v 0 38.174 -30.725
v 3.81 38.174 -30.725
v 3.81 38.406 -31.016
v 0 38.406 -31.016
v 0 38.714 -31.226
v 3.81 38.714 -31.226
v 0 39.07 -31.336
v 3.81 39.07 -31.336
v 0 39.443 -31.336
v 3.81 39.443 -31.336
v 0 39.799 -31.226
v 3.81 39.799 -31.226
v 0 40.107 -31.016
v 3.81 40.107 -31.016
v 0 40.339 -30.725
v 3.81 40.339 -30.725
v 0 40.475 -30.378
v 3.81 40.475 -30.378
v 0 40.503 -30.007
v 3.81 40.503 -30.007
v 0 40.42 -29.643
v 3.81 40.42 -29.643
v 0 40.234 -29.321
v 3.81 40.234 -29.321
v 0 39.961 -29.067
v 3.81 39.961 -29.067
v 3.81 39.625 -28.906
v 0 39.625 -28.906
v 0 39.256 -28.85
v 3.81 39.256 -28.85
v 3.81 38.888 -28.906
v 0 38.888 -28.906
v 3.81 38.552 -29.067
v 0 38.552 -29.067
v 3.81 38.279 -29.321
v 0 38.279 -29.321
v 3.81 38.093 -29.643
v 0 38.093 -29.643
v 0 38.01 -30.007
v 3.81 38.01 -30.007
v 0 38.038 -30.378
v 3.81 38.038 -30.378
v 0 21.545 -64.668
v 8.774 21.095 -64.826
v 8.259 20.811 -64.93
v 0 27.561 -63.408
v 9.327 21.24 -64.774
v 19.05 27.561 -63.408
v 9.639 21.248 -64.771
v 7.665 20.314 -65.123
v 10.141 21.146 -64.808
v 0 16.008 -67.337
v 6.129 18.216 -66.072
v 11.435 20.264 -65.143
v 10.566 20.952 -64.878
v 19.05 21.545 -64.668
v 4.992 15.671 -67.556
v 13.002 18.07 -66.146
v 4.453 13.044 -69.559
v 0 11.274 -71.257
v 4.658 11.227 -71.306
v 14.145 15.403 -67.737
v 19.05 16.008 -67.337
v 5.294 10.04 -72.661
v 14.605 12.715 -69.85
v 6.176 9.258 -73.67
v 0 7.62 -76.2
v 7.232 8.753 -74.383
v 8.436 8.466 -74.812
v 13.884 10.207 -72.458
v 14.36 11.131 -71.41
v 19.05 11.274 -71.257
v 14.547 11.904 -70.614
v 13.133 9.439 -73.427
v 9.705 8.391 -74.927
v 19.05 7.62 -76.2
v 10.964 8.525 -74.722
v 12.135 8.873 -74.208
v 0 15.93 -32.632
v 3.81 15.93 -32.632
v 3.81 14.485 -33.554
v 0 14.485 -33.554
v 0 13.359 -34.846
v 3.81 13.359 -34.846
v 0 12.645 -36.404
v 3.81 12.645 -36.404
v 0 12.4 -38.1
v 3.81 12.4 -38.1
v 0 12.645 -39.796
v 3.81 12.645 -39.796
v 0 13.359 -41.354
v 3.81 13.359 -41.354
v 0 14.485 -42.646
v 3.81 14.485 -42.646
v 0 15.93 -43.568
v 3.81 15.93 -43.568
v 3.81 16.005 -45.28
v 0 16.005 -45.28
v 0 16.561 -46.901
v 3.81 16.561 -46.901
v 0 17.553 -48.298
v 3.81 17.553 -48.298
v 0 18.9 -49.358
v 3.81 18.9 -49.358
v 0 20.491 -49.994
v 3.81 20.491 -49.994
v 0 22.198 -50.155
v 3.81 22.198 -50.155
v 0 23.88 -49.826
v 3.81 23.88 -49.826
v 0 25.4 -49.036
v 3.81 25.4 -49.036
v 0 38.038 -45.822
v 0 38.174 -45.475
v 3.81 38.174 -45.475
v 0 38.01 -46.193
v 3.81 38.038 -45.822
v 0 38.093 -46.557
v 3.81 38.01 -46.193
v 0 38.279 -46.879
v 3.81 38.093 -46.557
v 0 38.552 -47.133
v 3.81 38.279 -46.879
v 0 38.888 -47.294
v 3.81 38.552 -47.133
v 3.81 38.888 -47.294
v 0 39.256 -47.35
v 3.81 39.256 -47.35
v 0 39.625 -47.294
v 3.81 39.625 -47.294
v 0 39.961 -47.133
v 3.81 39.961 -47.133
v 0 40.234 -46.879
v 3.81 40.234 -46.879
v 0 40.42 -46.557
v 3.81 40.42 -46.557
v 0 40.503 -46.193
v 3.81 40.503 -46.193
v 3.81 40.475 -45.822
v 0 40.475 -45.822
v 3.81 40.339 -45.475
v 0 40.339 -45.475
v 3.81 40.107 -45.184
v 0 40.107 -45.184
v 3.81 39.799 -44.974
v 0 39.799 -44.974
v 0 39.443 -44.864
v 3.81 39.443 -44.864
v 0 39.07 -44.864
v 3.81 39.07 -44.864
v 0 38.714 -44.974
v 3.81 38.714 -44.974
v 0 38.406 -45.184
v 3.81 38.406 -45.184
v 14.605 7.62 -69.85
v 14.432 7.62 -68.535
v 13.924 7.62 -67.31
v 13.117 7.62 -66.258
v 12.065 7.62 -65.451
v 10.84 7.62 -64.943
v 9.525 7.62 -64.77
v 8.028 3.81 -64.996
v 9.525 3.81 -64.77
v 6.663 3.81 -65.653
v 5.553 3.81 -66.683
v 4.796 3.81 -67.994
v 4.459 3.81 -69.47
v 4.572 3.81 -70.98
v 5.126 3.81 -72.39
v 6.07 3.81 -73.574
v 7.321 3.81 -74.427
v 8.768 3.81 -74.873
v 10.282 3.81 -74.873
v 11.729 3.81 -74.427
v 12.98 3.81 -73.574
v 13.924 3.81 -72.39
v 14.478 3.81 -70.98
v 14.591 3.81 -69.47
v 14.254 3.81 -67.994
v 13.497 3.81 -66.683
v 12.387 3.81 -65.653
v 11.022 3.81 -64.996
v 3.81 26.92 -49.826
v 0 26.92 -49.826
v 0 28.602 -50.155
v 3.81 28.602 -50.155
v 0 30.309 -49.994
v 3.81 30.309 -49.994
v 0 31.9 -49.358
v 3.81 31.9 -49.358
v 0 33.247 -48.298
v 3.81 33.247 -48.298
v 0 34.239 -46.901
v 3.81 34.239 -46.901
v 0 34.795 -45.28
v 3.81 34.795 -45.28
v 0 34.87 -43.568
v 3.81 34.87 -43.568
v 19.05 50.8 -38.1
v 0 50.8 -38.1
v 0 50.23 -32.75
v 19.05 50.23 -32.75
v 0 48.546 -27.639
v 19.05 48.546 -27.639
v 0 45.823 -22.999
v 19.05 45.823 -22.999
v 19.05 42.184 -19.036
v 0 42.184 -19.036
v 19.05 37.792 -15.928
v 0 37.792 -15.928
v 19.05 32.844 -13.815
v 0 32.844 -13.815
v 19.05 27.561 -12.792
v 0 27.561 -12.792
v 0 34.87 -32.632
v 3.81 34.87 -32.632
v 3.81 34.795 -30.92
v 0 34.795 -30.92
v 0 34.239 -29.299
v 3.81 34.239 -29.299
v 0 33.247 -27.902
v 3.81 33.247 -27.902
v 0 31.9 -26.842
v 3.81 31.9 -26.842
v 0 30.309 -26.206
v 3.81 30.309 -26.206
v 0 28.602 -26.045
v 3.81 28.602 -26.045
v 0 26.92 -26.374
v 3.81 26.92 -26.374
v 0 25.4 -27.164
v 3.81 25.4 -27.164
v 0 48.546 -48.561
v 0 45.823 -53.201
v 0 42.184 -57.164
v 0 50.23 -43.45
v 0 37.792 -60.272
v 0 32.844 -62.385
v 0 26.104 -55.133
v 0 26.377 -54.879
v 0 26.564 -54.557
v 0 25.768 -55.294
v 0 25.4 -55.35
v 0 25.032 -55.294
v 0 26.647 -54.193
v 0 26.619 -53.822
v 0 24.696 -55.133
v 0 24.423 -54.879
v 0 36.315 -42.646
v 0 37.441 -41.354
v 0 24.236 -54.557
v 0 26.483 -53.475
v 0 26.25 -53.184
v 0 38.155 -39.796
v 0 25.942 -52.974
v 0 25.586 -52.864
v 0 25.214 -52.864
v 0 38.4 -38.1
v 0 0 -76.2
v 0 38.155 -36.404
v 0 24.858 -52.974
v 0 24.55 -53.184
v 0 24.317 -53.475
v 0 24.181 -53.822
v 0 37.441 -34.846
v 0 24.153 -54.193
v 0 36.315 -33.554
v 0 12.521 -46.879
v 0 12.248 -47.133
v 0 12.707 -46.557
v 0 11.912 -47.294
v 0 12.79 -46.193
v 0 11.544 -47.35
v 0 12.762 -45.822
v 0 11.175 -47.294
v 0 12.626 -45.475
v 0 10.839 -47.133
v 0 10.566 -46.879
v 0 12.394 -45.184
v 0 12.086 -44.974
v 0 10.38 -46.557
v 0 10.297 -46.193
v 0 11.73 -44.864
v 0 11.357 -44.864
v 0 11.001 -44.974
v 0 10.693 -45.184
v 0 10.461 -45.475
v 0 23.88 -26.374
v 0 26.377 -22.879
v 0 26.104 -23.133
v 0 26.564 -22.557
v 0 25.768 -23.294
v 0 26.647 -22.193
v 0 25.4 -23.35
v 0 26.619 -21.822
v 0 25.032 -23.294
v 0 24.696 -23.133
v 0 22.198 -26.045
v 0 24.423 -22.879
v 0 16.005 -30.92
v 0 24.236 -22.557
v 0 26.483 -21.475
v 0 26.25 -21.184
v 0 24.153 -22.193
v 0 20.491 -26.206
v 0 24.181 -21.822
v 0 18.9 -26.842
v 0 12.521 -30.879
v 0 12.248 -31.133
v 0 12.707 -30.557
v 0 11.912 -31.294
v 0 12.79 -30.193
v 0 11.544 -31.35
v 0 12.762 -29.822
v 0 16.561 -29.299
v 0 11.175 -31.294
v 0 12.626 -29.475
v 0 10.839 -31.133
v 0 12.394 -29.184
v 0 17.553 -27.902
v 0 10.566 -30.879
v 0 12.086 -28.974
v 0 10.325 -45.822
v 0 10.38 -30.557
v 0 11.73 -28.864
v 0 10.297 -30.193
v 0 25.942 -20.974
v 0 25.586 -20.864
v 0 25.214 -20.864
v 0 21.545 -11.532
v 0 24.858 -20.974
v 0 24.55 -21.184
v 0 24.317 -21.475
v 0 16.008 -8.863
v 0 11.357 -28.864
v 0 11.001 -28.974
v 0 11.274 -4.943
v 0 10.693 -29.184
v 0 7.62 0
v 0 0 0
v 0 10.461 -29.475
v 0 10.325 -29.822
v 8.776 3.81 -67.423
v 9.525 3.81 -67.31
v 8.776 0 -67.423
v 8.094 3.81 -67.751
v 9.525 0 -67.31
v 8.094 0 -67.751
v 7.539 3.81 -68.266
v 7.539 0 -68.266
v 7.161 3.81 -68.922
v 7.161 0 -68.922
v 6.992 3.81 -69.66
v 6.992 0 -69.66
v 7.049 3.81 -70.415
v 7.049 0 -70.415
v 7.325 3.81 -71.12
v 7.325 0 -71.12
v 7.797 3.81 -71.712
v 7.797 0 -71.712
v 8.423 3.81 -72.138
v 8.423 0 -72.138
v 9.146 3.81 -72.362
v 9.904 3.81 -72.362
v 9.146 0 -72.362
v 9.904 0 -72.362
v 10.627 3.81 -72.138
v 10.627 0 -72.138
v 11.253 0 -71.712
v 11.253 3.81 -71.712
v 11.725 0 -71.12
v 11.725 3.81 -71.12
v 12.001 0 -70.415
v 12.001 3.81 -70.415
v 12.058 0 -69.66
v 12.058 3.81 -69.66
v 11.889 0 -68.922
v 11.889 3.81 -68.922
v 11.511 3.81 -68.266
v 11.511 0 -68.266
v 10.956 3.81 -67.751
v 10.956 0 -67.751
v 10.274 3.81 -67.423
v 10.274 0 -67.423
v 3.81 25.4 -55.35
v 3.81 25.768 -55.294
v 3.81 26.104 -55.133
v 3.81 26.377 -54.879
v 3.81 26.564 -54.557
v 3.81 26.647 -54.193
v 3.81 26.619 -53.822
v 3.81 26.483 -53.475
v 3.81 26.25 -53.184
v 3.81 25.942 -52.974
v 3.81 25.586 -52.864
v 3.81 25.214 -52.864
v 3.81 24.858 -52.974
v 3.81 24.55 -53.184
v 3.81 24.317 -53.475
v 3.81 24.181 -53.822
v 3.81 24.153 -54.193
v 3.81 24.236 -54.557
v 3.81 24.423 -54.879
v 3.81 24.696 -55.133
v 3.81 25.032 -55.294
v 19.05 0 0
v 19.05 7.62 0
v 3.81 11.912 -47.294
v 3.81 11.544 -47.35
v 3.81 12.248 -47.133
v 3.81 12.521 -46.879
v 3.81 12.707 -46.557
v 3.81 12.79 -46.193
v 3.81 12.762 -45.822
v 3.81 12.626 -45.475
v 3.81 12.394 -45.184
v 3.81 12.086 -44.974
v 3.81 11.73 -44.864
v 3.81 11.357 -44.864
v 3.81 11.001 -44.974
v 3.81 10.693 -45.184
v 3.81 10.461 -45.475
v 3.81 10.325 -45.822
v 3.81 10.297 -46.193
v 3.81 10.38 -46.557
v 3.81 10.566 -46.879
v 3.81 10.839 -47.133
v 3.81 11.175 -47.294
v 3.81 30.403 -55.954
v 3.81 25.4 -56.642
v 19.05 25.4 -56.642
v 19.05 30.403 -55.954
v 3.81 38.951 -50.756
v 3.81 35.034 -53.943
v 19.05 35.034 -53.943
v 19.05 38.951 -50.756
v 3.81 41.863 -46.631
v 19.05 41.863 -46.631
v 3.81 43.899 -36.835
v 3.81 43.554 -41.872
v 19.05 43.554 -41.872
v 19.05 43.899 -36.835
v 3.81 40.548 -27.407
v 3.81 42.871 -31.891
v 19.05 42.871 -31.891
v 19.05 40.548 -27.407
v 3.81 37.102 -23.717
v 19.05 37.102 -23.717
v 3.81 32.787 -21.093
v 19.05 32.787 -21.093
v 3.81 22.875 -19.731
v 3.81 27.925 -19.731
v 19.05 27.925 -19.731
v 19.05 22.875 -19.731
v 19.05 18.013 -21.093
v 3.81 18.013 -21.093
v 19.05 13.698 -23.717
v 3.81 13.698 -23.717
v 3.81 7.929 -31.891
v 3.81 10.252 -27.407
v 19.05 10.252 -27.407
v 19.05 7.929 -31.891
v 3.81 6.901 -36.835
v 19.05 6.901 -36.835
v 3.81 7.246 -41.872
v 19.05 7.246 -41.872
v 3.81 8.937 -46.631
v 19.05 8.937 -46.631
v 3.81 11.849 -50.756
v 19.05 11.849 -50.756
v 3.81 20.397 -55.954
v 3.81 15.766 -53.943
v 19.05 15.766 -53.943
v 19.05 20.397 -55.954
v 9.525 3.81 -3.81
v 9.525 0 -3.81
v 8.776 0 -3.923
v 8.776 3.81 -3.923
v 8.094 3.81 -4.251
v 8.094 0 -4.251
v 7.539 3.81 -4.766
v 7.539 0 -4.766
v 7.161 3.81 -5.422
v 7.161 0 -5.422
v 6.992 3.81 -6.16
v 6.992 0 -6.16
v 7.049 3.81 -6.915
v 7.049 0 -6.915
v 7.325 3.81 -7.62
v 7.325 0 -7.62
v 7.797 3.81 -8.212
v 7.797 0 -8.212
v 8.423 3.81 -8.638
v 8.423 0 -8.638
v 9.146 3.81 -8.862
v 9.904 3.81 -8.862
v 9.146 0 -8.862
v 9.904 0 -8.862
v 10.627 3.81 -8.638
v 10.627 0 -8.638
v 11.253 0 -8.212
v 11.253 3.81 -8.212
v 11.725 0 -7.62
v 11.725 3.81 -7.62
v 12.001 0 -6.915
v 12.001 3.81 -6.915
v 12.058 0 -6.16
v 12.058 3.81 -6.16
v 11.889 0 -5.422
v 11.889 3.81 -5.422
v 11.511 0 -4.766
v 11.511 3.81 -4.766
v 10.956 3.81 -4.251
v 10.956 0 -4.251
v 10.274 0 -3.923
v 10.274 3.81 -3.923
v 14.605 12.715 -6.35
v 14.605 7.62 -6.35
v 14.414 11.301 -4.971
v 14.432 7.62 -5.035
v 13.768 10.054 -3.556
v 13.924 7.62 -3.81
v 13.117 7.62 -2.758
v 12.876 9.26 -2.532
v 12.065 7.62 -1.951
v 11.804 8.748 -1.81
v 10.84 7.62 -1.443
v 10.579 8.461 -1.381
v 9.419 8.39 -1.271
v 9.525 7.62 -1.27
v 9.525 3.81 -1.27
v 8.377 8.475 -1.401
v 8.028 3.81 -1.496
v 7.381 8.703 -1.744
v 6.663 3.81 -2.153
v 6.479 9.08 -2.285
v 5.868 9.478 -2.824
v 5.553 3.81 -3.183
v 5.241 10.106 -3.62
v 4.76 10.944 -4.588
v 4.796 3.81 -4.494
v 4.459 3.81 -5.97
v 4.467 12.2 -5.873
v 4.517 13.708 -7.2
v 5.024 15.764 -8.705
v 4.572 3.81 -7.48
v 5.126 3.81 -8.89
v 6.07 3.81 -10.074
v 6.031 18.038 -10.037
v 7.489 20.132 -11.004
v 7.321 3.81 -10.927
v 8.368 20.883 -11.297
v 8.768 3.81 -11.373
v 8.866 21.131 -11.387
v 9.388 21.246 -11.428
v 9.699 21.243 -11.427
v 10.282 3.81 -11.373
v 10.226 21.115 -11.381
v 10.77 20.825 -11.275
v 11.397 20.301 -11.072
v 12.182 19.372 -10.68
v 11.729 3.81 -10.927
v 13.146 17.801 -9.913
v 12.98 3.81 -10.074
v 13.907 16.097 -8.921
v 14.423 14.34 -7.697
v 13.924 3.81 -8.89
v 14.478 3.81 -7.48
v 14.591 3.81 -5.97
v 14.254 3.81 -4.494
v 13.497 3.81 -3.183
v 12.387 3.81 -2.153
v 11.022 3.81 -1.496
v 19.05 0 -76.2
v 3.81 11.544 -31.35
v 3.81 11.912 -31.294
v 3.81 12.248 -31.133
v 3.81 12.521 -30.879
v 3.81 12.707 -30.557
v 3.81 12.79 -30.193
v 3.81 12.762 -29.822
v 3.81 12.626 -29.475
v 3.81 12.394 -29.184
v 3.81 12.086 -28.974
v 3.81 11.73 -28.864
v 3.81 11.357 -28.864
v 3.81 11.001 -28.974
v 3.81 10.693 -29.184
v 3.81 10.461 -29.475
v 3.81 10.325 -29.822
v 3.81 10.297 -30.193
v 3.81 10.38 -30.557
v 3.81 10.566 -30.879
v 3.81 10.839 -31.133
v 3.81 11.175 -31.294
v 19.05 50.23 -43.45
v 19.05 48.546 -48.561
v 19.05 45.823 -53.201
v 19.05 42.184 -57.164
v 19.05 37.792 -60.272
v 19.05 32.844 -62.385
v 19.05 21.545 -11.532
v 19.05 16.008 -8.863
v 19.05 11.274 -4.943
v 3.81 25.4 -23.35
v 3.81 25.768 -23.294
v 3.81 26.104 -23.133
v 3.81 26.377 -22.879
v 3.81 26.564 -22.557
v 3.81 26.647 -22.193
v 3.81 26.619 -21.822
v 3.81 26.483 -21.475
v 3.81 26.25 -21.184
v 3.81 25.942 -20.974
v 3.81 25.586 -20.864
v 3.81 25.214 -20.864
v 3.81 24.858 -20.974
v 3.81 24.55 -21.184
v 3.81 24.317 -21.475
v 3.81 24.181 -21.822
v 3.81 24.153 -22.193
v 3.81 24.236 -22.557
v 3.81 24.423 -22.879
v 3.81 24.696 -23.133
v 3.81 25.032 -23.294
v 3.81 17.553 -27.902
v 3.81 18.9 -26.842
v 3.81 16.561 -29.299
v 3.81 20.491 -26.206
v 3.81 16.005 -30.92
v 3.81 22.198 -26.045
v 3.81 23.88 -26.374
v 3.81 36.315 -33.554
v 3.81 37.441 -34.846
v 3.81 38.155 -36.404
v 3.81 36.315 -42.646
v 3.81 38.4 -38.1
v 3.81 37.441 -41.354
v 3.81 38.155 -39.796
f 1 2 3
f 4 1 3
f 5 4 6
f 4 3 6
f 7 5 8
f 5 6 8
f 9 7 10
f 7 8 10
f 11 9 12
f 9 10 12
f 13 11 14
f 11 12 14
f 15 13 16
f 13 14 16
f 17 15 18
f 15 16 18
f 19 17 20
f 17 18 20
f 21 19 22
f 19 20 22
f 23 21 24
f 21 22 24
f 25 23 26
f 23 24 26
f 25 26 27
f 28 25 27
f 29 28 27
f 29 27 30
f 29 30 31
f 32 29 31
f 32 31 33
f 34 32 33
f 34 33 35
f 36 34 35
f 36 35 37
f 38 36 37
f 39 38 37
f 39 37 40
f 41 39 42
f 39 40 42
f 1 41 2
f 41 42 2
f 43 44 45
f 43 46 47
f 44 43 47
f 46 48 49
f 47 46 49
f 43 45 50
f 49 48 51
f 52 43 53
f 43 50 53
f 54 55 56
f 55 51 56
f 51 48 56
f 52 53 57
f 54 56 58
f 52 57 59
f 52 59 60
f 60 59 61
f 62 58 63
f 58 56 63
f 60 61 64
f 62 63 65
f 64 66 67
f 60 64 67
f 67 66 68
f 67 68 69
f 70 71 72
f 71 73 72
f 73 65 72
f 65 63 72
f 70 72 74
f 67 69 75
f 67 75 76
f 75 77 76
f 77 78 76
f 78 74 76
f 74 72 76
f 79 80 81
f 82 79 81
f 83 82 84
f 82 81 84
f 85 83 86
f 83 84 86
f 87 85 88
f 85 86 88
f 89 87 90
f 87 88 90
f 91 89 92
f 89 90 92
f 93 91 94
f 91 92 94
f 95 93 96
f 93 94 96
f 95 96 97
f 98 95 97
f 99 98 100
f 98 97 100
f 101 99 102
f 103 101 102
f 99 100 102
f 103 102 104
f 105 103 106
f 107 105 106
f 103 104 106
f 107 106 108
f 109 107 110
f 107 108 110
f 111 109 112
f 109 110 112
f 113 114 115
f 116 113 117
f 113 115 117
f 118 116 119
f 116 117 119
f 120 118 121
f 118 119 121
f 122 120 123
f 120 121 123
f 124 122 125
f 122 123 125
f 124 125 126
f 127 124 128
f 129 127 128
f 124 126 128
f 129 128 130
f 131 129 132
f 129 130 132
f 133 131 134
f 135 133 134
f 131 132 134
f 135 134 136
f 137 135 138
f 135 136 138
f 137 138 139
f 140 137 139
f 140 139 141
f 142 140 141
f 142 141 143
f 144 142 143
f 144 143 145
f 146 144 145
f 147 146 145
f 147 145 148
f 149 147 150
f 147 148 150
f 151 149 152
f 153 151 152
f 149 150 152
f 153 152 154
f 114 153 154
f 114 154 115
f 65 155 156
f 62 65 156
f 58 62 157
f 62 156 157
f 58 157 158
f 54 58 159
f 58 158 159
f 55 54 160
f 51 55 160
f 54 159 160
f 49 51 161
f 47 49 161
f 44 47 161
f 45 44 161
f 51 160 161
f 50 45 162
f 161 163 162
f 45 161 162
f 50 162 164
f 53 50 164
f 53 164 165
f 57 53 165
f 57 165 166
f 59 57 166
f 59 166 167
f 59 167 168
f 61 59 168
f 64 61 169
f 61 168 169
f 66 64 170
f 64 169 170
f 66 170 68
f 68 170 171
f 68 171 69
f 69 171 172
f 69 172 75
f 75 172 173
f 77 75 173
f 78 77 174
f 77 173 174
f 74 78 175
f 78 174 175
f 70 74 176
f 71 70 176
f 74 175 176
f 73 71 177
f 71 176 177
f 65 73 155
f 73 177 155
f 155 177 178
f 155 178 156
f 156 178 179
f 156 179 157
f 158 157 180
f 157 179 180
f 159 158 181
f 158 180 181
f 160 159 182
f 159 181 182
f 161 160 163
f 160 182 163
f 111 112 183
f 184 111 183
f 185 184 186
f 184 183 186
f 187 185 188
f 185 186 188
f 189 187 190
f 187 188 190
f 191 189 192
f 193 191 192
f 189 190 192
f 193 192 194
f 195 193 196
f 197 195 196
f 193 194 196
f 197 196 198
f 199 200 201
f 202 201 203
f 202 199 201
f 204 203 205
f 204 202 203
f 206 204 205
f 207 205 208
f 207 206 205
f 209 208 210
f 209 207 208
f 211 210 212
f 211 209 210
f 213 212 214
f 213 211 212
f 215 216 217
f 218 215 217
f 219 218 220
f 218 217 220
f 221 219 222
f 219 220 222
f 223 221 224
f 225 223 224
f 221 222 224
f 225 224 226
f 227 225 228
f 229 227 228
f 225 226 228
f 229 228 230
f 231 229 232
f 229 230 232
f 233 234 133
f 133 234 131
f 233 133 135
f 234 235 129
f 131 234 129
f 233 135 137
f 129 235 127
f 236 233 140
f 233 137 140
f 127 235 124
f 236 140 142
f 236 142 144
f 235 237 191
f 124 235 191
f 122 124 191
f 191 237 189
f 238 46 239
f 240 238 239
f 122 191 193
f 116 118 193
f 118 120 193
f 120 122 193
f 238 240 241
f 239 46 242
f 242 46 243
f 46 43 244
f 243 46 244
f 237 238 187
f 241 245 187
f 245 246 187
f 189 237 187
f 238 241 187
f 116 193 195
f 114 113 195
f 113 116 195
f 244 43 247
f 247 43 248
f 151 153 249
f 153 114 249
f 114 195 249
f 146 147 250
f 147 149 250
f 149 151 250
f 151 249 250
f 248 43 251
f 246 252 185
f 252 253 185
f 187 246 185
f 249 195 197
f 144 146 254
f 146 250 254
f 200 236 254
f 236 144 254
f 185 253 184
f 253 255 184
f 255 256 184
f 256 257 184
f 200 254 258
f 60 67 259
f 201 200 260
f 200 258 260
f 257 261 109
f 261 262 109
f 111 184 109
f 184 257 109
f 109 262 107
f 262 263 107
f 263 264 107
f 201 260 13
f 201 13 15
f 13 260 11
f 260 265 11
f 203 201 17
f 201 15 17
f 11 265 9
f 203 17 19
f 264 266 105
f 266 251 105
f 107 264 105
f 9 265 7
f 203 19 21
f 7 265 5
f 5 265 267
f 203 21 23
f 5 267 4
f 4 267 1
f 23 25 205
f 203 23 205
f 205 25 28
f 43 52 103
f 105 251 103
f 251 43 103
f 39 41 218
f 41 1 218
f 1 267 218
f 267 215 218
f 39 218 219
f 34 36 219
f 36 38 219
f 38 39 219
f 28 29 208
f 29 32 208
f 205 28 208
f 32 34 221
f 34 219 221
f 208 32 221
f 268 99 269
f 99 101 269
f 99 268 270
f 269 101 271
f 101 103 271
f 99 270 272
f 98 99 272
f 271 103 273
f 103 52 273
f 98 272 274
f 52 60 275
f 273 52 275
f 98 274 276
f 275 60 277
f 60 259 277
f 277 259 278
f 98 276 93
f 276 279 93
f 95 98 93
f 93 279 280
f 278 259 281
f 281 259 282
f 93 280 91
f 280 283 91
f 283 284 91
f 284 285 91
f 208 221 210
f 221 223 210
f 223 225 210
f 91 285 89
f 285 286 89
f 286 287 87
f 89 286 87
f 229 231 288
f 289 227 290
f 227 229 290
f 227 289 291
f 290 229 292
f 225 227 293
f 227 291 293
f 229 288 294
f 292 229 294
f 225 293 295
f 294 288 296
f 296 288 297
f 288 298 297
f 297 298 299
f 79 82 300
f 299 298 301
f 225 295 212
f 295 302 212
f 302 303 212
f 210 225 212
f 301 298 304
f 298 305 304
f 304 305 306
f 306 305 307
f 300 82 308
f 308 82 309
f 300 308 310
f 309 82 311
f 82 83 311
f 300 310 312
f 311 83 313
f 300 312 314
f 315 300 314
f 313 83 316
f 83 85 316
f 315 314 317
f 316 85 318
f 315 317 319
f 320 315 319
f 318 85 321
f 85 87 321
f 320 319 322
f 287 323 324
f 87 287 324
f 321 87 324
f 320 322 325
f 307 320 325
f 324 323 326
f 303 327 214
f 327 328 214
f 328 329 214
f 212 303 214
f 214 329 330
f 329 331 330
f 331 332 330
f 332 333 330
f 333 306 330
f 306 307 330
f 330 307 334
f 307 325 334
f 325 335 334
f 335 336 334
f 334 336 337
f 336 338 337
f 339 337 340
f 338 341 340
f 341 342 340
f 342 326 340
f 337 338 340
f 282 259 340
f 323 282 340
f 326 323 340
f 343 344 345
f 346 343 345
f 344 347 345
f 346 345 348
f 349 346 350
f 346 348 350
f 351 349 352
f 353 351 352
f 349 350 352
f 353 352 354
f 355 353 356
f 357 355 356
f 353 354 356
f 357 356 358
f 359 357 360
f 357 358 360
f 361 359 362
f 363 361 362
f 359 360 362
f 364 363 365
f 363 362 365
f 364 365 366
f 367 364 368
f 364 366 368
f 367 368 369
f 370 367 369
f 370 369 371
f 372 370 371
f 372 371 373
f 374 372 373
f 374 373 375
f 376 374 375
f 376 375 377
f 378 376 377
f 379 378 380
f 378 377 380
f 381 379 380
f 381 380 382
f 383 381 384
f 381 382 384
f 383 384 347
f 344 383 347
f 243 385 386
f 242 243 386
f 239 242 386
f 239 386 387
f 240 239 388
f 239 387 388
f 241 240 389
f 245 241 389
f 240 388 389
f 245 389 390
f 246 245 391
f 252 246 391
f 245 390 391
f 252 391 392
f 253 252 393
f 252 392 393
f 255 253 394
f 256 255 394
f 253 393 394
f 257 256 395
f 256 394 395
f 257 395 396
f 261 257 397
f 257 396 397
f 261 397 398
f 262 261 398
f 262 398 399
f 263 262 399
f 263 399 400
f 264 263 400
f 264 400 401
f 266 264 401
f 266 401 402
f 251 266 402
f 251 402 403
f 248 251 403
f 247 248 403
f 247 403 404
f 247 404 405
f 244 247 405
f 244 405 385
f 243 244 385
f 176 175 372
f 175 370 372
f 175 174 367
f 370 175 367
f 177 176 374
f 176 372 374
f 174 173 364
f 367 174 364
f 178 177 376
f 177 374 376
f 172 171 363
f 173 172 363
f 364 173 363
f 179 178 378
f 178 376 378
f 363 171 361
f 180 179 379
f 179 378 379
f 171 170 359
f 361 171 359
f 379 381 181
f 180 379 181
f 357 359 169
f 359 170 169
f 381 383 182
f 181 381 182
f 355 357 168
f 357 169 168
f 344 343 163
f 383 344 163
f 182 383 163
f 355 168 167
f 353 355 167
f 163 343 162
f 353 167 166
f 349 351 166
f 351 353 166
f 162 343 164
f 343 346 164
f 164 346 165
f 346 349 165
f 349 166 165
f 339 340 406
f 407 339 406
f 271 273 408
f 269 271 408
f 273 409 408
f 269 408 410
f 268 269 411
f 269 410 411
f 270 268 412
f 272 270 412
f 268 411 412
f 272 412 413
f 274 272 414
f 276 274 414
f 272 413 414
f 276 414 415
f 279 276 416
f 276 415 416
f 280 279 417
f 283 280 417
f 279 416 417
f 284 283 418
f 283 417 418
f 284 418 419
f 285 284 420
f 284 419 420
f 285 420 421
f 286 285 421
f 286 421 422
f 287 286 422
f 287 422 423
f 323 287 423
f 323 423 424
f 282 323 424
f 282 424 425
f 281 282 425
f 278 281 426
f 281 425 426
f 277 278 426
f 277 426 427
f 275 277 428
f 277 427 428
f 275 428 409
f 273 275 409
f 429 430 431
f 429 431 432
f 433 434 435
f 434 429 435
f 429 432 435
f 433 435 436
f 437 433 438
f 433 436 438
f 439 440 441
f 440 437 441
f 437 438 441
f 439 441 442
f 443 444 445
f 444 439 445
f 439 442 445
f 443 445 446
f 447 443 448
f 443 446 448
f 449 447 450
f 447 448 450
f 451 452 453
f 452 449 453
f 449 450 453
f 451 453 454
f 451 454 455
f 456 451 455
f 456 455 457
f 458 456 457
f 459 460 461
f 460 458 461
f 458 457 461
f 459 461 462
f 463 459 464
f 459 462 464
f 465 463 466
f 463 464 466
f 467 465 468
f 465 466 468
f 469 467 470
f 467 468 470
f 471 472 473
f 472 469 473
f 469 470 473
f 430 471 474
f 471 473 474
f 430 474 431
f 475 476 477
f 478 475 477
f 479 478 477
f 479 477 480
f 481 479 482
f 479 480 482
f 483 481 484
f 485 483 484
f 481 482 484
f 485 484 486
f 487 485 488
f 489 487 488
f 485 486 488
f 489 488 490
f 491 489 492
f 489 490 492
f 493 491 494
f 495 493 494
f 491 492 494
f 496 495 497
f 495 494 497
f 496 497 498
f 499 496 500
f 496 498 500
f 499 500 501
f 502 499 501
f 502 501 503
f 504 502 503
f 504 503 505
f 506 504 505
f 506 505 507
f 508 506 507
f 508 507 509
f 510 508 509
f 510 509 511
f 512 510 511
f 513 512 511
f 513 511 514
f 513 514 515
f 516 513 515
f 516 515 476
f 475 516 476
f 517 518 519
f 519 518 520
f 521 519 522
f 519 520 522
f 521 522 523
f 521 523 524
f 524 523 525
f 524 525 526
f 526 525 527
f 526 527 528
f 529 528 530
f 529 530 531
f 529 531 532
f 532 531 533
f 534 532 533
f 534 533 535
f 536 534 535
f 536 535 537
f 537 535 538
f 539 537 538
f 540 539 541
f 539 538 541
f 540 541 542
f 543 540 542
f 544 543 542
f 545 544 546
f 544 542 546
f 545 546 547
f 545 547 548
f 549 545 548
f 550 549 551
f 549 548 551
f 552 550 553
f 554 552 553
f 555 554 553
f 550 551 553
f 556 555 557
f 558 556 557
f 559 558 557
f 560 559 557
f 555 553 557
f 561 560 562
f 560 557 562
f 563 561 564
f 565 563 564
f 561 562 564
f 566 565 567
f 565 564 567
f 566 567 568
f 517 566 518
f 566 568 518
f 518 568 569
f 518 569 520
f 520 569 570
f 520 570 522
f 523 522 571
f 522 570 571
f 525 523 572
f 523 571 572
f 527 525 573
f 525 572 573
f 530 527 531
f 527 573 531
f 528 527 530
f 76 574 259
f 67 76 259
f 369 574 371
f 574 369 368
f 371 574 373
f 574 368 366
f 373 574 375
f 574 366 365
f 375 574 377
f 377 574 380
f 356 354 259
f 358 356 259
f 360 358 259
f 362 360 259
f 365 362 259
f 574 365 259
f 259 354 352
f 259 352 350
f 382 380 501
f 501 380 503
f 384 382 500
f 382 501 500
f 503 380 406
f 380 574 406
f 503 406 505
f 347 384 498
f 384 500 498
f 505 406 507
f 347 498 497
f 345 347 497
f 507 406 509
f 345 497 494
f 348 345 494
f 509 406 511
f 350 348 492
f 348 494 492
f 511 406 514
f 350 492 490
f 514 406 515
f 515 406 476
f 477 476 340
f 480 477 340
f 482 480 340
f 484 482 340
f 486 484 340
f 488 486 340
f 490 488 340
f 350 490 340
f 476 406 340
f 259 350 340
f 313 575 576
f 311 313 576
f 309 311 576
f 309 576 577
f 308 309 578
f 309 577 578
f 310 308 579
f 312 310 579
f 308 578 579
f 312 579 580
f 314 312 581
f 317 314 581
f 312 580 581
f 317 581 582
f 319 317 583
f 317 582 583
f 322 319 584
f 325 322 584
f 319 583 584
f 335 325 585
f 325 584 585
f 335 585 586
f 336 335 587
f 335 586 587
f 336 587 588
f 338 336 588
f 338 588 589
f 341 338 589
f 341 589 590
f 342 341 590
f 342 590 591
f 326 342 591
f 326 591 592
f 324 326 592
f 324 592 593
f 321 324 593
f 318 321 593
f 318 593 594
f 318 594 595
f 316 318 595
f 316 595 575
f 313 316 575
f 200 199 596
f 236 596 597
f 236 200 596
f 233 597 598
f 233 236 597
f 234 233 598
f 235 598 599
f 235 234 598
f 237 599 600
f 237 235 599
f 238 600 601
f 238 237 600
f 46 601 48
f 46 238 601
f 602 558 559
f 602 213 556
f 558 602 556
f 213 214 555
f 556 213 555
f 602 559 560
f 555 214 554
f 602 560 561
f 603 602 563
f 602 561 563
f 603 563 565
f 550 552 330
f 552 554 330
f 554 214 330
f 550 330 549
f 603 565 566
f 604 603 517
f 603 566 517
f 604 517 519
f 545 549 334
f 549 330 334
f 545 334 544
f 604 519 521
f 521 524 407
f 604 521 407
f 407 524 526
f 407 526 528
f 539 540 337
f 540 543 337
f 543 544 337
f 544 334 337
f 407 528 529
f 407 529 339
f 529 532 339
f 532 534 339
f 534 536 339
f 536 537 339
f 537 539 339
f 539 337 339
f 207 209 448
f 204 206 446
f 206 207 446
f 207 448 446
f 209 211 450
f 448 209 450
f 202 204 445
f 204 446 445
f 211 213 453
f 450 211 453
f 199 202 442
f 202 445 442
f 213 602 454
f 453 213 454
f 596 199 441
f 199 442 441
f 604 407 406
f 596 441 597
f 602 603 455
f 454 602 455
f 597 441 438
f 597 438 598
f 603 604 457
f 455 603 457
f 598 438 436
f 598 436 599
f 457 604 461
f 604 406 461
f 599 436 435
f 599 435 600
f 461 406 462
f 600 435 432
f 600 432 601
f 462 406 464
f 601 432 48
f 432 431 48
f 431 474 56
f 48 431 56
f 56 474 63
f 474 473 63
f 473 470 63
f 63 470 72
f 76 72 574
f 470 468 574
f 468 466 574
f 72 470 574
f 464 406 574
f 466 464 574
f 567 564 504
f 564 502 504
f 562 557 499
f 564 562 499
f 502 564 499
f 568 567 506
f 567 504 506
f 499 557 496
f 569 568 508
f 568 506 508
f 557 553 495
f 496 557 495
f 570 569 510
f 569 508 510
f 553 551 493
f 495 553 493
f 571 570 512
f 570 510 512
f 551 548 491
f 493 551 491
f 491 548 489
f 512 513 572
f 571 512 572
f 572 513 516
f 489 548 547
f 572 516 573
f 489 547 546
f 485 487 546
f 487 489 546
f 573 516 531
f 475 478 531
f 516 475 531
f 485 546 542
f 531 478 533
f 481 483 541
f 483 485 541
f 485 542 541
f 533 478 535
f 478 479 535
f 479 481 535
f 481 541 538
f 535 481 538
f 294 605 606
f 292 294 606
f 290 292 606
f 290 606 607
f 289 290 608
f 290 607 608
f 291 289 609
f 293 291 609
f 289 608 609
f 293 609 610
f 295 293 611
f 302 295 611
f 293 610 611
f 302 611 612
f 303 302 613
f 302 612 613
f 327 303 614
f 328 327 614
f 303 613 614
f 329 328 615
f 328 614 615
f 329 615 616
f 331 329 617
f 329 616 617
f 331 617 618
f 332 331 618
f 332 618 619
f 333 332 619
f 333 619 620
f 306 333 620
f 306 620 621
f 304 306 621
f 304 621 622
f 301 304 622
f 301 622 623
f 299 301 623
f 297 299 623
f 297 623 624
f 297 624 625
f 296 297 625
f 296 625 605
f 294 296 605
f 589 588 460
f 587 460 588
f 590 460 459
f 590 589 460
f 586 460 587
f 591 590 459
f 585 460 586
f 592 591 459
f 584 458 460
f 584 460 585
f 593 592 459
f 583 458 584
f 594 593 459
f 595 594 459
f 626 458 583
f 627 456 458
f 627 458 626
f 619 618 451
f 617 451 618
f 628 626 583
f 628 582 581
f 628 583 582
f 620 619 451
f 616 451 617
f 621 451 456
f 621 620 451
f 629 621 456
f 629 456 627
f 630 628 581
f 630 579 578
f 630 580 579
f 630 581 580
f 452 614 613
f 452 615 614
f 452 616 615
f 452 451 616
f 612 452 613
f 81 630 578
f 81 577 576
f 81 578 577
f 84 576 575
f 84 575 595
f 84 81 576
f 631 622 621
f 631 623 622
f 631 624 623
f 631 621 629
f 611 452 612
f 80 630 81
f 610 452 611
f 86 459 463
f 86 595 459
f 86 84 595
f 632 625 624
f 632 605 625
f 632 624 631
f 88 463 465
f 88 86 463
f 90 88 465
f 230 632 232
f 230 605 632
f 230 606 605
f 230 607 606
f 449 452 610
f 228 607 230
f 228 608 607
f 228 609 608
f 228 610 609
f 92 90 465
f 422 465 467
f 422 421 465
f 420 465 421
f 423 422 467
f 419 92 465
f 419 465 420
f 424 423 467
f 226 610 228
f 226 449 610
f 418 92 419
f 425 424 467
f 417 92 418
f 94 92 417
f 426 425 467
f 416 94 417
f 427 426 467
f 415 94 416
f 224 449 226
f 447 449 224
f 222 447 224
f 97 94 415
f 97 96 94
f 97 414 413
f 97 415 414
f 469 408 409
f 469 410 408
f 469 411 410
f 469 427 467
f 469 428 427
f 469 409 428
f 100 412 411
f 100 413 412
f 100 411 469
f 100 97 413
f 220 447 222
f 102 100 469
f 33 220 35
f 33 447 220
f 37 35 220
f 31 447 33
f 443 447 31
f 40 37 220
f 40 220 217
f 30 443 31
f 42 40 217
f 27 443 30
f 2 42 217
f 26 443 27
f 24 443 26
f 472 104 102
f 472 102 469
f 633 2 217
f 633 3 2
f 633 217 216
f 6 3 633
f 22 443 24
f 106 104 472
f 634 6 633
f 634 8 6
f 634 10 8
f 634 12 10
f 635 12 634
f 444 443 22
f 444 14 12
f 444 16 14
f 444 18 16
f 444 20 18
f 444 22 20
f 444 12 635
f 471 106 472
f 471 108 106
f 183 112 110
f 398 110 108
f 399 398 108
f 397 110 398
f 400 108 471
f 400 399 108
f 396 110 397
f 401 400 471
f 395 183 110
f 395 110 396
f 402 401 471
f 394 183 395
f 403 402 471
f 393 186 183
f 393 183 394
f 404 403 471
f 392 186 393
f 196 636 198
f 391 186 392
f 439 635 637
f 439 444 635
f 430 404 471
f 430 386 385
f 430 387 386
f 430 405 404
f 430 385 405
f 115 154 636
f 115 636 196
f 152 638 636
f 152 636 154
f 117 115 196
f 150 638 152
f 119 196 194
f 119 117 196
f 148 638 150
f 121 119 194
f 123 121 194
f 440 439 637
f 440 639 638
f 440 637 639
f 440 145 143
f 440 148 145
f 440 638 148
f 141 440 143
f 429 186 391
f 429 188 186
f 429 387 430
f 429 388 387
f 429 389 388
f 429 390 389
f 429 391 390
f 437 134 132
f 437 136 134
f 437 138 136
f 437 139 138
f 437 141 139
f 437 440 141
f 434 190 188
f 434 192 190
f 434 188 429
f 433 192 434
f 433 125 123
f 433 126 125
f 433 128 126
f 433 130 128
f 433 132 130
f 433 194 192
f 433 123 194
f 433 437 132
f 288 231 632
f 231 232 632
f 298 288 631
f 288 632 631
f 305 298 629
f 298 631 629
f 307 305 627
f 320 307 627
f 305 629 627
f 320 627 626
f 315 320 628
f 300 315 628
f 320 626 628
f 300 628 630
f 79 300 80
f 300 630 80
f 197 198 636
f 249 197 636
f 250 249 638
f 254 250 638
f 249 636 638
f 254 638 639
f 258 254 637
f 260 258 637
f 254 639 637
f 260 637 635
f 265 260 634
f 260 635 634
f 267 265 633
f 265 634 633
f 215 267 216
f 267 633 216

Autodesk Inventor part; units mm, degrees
ref_plane "YZ Plane" through (0, 0, 0) normal (1, 0, 0) x (0, 1, 0)
ref_plane "XZ Plane" through (0, 0, 0) normal (0, 1, 0) x (-1, 0, 0)
ref_plane "XY Plane" through (0, 0, 0) normal (0, 0, 1) x (1, 0, 0)
sketch "Sketch1" plane through (0, 0, 0) normal (0, 1, 0) x (-1, 0, 0)
  line L0 (0, 0) -> (-19.05, 0)
  line L1 (-19.05, 0) -> (-19.05, -76.2)
  line L2 (-19.05, -76.2) -> (0, -76.2)
  line L3 (0, -76.2) -> (0, 0)
  dimension "d0" = 19.05
  dimension "d1" = 76.2
extrude "Extrusion1" add sketch "Sketch1" along normal blind 7.62
sketch "Sketch2" plane through (0, 7.62, 0) normal (0, 1, 0) x (1, 0, 0)
  line L0 (0, 0) -> (0, 12.7)
  line L1 (0, 12.7) -> (19.05, 12.7)
  line L2 (19.05, 12.7) -> (19.05, 63.5)
  line L3 (19.05, 63.5) -> (0, 63.5)
  line L4 (0, 63.5) -> (0, 12.7)
  dimension "d4" = 12.7
  dimension "d5" = 19.05
  dimension "d6" = 50.8
extrude "Extrusion2" add sketch "Sketch2" along normal blind 43.18
sketch "Sketch3" plane through (19.05, 0, 0) normal (1, 0, 0) x (0, 0, -1)
  line L0 (12.7, 50.8) -> (63.5, 50.8) projected
  line L1 (38.1, 50.8) -> (38.1, 25.4)
  circle A0 centre (38.1, 25.4) radius 18.542
  point P0 (0, 0)
  dimension "d9" = 25.4
  dimension "d10" = 37.084
extrude "Extrusion3" cut sketch "Sketch3" against normal blind 15.24
fillet "Fillet1" radius 25.4 2 edges at (9.525, 50.8, -63.5) (9.525, 50.8, -12.7)
sketch "Sketch6" plane through (0, 7.62, 0) normal (0, 1, 0) x (1, 0, 0)
  line L0 (0, 0) -> (19.05, 0) projected
  line L1 (9.525, 0) -> (9.525, 6.35)
  line L2 (19.05, 76.2) -> (0, 76.2) projected
  line L3 (9.525, 76.2) -> (9.525, 69.85)
  dimension "d20" = 6.35
  dimension "d21" = 6.35
fillet "Fillet2" radius 25.4 2 edges at (9.525, 7.62, -63.5) (9.525, 7.62, -12.7)
hole "Hole1" at (9.525, 7.62, -6.35) at (9.525, 7.62, -69.85) direction (0, -1, 0) diameter 5.08 end through all counterbore diameter 10.16 counterbore depth 3.81
sketch "Sketch7" plane through (9.525, 7.62, -6.35) normal (0, -1, 0) x (1, 0, 0)
  circle A0 centre (0, 0) radius 5.08
  circle A1 centre (0, -63.5) radius 2.54 projected
  line L0 (-2.54, -63.5) -> (0, -63.5)
  circle A2 centre (0, -63.5) radius 5.08
  point P0 (-9.525, 6.35)
  dimension "d30" = 10.16
  dimension "d31" = 10.16
extrude "Extrusion5" cut sketch "Sketch7" against normal blind 15.24 contours A0 | A1 | A2
sketch "Sketch10" plane through (3.81, 25.4, -38.1) normal (1, 0, 0) x (0, 0, -1)
  circle A0 centre (0, 0) radius 18.542 projected
  circle A1 centre (-8, -13.8564) radius 1.25
  circle A2 centre (0, 7) radius 6
  circle A3 centre (16, 0) radius 1.25
  circle A4 centre (8, -13.8564) radius 1.25
  circle A5 centre (-16, 0) radius 1.25
  circle A6 centre (8, -13.8564) radius 1.25
  circle A7 centre (-8, -13.8564) radius 1.25
  circle A8 centre (-8, -13.8564) radius 1.25
  circle A9 centre (-16, 0) radius 1.25
  circle A10 centre (16, 0) radius 1.25
  point P0 (-38.1, -25.4)
extrude "Extrusion8" cut sketch "Sketch10" against normal blind 25.4 contours A1 | A2 | A3 | A4 | A5
pattern_circular "Circular Pattern4" count 6 over 360 about axis through (19.05, 25.4, -38.1) along (-1, 0, 0) of "Extrusion8"
sketch "Sketch14" plane through (3.81, 0, 0) normal (1, 0, 0) x (0, 0, -1)
  arc A0 (36.735, 25.4) -> (37.4175, 26.5821) centre (31.9408, 28.956) ccw projected
  arc A1 (37.4175, 24.2179) -> (36.735, 25.4) centre (31.9408, 21.844) ccw projected
  arc A2 (38.7825, 24.2179) -> (37.4175, 24.2179) centre (38.1, 18.288) ccw projected
  arc A3 (39.465, 25.4) -> (38.7825, 24.2179) centre (44.2592, 21.844) ccw projected
  arc A4 (38.7825, 26.5821) -> (39.465, 25.4) centre (44.2592, 28.956) ccw projected
  arc A5 (37.4175, 26.5821) -> (38.7825, 26.5821) centre (38.1, 32.512) ccw projected
  line L0 (38.7825, 24.2179) -> (37.4175, 24.2179)
  line L1 (37.4175, 24.2179) -> (36.735, 25.4)
  line L2 (36.735, 25.4) -> (37.4175, 26.5821)
  line L3 (37.4175, 26.5821) -> (38.7825, 26.5821)
  line L4 (38.7825, 26.5821) -> (39.465, 25.4)
  line L5 (39.465, 25.4) -> (38.7825, 24.2179)
  point P0 (0, 0)
  point P1 (38.1, 25.4)
extrude "Extrusion10" cut sketch "Sketch14" against normal blind 25.4 contours A0 A5 A4 A3 A2 A1
properties part number "Motor Mount V2"
